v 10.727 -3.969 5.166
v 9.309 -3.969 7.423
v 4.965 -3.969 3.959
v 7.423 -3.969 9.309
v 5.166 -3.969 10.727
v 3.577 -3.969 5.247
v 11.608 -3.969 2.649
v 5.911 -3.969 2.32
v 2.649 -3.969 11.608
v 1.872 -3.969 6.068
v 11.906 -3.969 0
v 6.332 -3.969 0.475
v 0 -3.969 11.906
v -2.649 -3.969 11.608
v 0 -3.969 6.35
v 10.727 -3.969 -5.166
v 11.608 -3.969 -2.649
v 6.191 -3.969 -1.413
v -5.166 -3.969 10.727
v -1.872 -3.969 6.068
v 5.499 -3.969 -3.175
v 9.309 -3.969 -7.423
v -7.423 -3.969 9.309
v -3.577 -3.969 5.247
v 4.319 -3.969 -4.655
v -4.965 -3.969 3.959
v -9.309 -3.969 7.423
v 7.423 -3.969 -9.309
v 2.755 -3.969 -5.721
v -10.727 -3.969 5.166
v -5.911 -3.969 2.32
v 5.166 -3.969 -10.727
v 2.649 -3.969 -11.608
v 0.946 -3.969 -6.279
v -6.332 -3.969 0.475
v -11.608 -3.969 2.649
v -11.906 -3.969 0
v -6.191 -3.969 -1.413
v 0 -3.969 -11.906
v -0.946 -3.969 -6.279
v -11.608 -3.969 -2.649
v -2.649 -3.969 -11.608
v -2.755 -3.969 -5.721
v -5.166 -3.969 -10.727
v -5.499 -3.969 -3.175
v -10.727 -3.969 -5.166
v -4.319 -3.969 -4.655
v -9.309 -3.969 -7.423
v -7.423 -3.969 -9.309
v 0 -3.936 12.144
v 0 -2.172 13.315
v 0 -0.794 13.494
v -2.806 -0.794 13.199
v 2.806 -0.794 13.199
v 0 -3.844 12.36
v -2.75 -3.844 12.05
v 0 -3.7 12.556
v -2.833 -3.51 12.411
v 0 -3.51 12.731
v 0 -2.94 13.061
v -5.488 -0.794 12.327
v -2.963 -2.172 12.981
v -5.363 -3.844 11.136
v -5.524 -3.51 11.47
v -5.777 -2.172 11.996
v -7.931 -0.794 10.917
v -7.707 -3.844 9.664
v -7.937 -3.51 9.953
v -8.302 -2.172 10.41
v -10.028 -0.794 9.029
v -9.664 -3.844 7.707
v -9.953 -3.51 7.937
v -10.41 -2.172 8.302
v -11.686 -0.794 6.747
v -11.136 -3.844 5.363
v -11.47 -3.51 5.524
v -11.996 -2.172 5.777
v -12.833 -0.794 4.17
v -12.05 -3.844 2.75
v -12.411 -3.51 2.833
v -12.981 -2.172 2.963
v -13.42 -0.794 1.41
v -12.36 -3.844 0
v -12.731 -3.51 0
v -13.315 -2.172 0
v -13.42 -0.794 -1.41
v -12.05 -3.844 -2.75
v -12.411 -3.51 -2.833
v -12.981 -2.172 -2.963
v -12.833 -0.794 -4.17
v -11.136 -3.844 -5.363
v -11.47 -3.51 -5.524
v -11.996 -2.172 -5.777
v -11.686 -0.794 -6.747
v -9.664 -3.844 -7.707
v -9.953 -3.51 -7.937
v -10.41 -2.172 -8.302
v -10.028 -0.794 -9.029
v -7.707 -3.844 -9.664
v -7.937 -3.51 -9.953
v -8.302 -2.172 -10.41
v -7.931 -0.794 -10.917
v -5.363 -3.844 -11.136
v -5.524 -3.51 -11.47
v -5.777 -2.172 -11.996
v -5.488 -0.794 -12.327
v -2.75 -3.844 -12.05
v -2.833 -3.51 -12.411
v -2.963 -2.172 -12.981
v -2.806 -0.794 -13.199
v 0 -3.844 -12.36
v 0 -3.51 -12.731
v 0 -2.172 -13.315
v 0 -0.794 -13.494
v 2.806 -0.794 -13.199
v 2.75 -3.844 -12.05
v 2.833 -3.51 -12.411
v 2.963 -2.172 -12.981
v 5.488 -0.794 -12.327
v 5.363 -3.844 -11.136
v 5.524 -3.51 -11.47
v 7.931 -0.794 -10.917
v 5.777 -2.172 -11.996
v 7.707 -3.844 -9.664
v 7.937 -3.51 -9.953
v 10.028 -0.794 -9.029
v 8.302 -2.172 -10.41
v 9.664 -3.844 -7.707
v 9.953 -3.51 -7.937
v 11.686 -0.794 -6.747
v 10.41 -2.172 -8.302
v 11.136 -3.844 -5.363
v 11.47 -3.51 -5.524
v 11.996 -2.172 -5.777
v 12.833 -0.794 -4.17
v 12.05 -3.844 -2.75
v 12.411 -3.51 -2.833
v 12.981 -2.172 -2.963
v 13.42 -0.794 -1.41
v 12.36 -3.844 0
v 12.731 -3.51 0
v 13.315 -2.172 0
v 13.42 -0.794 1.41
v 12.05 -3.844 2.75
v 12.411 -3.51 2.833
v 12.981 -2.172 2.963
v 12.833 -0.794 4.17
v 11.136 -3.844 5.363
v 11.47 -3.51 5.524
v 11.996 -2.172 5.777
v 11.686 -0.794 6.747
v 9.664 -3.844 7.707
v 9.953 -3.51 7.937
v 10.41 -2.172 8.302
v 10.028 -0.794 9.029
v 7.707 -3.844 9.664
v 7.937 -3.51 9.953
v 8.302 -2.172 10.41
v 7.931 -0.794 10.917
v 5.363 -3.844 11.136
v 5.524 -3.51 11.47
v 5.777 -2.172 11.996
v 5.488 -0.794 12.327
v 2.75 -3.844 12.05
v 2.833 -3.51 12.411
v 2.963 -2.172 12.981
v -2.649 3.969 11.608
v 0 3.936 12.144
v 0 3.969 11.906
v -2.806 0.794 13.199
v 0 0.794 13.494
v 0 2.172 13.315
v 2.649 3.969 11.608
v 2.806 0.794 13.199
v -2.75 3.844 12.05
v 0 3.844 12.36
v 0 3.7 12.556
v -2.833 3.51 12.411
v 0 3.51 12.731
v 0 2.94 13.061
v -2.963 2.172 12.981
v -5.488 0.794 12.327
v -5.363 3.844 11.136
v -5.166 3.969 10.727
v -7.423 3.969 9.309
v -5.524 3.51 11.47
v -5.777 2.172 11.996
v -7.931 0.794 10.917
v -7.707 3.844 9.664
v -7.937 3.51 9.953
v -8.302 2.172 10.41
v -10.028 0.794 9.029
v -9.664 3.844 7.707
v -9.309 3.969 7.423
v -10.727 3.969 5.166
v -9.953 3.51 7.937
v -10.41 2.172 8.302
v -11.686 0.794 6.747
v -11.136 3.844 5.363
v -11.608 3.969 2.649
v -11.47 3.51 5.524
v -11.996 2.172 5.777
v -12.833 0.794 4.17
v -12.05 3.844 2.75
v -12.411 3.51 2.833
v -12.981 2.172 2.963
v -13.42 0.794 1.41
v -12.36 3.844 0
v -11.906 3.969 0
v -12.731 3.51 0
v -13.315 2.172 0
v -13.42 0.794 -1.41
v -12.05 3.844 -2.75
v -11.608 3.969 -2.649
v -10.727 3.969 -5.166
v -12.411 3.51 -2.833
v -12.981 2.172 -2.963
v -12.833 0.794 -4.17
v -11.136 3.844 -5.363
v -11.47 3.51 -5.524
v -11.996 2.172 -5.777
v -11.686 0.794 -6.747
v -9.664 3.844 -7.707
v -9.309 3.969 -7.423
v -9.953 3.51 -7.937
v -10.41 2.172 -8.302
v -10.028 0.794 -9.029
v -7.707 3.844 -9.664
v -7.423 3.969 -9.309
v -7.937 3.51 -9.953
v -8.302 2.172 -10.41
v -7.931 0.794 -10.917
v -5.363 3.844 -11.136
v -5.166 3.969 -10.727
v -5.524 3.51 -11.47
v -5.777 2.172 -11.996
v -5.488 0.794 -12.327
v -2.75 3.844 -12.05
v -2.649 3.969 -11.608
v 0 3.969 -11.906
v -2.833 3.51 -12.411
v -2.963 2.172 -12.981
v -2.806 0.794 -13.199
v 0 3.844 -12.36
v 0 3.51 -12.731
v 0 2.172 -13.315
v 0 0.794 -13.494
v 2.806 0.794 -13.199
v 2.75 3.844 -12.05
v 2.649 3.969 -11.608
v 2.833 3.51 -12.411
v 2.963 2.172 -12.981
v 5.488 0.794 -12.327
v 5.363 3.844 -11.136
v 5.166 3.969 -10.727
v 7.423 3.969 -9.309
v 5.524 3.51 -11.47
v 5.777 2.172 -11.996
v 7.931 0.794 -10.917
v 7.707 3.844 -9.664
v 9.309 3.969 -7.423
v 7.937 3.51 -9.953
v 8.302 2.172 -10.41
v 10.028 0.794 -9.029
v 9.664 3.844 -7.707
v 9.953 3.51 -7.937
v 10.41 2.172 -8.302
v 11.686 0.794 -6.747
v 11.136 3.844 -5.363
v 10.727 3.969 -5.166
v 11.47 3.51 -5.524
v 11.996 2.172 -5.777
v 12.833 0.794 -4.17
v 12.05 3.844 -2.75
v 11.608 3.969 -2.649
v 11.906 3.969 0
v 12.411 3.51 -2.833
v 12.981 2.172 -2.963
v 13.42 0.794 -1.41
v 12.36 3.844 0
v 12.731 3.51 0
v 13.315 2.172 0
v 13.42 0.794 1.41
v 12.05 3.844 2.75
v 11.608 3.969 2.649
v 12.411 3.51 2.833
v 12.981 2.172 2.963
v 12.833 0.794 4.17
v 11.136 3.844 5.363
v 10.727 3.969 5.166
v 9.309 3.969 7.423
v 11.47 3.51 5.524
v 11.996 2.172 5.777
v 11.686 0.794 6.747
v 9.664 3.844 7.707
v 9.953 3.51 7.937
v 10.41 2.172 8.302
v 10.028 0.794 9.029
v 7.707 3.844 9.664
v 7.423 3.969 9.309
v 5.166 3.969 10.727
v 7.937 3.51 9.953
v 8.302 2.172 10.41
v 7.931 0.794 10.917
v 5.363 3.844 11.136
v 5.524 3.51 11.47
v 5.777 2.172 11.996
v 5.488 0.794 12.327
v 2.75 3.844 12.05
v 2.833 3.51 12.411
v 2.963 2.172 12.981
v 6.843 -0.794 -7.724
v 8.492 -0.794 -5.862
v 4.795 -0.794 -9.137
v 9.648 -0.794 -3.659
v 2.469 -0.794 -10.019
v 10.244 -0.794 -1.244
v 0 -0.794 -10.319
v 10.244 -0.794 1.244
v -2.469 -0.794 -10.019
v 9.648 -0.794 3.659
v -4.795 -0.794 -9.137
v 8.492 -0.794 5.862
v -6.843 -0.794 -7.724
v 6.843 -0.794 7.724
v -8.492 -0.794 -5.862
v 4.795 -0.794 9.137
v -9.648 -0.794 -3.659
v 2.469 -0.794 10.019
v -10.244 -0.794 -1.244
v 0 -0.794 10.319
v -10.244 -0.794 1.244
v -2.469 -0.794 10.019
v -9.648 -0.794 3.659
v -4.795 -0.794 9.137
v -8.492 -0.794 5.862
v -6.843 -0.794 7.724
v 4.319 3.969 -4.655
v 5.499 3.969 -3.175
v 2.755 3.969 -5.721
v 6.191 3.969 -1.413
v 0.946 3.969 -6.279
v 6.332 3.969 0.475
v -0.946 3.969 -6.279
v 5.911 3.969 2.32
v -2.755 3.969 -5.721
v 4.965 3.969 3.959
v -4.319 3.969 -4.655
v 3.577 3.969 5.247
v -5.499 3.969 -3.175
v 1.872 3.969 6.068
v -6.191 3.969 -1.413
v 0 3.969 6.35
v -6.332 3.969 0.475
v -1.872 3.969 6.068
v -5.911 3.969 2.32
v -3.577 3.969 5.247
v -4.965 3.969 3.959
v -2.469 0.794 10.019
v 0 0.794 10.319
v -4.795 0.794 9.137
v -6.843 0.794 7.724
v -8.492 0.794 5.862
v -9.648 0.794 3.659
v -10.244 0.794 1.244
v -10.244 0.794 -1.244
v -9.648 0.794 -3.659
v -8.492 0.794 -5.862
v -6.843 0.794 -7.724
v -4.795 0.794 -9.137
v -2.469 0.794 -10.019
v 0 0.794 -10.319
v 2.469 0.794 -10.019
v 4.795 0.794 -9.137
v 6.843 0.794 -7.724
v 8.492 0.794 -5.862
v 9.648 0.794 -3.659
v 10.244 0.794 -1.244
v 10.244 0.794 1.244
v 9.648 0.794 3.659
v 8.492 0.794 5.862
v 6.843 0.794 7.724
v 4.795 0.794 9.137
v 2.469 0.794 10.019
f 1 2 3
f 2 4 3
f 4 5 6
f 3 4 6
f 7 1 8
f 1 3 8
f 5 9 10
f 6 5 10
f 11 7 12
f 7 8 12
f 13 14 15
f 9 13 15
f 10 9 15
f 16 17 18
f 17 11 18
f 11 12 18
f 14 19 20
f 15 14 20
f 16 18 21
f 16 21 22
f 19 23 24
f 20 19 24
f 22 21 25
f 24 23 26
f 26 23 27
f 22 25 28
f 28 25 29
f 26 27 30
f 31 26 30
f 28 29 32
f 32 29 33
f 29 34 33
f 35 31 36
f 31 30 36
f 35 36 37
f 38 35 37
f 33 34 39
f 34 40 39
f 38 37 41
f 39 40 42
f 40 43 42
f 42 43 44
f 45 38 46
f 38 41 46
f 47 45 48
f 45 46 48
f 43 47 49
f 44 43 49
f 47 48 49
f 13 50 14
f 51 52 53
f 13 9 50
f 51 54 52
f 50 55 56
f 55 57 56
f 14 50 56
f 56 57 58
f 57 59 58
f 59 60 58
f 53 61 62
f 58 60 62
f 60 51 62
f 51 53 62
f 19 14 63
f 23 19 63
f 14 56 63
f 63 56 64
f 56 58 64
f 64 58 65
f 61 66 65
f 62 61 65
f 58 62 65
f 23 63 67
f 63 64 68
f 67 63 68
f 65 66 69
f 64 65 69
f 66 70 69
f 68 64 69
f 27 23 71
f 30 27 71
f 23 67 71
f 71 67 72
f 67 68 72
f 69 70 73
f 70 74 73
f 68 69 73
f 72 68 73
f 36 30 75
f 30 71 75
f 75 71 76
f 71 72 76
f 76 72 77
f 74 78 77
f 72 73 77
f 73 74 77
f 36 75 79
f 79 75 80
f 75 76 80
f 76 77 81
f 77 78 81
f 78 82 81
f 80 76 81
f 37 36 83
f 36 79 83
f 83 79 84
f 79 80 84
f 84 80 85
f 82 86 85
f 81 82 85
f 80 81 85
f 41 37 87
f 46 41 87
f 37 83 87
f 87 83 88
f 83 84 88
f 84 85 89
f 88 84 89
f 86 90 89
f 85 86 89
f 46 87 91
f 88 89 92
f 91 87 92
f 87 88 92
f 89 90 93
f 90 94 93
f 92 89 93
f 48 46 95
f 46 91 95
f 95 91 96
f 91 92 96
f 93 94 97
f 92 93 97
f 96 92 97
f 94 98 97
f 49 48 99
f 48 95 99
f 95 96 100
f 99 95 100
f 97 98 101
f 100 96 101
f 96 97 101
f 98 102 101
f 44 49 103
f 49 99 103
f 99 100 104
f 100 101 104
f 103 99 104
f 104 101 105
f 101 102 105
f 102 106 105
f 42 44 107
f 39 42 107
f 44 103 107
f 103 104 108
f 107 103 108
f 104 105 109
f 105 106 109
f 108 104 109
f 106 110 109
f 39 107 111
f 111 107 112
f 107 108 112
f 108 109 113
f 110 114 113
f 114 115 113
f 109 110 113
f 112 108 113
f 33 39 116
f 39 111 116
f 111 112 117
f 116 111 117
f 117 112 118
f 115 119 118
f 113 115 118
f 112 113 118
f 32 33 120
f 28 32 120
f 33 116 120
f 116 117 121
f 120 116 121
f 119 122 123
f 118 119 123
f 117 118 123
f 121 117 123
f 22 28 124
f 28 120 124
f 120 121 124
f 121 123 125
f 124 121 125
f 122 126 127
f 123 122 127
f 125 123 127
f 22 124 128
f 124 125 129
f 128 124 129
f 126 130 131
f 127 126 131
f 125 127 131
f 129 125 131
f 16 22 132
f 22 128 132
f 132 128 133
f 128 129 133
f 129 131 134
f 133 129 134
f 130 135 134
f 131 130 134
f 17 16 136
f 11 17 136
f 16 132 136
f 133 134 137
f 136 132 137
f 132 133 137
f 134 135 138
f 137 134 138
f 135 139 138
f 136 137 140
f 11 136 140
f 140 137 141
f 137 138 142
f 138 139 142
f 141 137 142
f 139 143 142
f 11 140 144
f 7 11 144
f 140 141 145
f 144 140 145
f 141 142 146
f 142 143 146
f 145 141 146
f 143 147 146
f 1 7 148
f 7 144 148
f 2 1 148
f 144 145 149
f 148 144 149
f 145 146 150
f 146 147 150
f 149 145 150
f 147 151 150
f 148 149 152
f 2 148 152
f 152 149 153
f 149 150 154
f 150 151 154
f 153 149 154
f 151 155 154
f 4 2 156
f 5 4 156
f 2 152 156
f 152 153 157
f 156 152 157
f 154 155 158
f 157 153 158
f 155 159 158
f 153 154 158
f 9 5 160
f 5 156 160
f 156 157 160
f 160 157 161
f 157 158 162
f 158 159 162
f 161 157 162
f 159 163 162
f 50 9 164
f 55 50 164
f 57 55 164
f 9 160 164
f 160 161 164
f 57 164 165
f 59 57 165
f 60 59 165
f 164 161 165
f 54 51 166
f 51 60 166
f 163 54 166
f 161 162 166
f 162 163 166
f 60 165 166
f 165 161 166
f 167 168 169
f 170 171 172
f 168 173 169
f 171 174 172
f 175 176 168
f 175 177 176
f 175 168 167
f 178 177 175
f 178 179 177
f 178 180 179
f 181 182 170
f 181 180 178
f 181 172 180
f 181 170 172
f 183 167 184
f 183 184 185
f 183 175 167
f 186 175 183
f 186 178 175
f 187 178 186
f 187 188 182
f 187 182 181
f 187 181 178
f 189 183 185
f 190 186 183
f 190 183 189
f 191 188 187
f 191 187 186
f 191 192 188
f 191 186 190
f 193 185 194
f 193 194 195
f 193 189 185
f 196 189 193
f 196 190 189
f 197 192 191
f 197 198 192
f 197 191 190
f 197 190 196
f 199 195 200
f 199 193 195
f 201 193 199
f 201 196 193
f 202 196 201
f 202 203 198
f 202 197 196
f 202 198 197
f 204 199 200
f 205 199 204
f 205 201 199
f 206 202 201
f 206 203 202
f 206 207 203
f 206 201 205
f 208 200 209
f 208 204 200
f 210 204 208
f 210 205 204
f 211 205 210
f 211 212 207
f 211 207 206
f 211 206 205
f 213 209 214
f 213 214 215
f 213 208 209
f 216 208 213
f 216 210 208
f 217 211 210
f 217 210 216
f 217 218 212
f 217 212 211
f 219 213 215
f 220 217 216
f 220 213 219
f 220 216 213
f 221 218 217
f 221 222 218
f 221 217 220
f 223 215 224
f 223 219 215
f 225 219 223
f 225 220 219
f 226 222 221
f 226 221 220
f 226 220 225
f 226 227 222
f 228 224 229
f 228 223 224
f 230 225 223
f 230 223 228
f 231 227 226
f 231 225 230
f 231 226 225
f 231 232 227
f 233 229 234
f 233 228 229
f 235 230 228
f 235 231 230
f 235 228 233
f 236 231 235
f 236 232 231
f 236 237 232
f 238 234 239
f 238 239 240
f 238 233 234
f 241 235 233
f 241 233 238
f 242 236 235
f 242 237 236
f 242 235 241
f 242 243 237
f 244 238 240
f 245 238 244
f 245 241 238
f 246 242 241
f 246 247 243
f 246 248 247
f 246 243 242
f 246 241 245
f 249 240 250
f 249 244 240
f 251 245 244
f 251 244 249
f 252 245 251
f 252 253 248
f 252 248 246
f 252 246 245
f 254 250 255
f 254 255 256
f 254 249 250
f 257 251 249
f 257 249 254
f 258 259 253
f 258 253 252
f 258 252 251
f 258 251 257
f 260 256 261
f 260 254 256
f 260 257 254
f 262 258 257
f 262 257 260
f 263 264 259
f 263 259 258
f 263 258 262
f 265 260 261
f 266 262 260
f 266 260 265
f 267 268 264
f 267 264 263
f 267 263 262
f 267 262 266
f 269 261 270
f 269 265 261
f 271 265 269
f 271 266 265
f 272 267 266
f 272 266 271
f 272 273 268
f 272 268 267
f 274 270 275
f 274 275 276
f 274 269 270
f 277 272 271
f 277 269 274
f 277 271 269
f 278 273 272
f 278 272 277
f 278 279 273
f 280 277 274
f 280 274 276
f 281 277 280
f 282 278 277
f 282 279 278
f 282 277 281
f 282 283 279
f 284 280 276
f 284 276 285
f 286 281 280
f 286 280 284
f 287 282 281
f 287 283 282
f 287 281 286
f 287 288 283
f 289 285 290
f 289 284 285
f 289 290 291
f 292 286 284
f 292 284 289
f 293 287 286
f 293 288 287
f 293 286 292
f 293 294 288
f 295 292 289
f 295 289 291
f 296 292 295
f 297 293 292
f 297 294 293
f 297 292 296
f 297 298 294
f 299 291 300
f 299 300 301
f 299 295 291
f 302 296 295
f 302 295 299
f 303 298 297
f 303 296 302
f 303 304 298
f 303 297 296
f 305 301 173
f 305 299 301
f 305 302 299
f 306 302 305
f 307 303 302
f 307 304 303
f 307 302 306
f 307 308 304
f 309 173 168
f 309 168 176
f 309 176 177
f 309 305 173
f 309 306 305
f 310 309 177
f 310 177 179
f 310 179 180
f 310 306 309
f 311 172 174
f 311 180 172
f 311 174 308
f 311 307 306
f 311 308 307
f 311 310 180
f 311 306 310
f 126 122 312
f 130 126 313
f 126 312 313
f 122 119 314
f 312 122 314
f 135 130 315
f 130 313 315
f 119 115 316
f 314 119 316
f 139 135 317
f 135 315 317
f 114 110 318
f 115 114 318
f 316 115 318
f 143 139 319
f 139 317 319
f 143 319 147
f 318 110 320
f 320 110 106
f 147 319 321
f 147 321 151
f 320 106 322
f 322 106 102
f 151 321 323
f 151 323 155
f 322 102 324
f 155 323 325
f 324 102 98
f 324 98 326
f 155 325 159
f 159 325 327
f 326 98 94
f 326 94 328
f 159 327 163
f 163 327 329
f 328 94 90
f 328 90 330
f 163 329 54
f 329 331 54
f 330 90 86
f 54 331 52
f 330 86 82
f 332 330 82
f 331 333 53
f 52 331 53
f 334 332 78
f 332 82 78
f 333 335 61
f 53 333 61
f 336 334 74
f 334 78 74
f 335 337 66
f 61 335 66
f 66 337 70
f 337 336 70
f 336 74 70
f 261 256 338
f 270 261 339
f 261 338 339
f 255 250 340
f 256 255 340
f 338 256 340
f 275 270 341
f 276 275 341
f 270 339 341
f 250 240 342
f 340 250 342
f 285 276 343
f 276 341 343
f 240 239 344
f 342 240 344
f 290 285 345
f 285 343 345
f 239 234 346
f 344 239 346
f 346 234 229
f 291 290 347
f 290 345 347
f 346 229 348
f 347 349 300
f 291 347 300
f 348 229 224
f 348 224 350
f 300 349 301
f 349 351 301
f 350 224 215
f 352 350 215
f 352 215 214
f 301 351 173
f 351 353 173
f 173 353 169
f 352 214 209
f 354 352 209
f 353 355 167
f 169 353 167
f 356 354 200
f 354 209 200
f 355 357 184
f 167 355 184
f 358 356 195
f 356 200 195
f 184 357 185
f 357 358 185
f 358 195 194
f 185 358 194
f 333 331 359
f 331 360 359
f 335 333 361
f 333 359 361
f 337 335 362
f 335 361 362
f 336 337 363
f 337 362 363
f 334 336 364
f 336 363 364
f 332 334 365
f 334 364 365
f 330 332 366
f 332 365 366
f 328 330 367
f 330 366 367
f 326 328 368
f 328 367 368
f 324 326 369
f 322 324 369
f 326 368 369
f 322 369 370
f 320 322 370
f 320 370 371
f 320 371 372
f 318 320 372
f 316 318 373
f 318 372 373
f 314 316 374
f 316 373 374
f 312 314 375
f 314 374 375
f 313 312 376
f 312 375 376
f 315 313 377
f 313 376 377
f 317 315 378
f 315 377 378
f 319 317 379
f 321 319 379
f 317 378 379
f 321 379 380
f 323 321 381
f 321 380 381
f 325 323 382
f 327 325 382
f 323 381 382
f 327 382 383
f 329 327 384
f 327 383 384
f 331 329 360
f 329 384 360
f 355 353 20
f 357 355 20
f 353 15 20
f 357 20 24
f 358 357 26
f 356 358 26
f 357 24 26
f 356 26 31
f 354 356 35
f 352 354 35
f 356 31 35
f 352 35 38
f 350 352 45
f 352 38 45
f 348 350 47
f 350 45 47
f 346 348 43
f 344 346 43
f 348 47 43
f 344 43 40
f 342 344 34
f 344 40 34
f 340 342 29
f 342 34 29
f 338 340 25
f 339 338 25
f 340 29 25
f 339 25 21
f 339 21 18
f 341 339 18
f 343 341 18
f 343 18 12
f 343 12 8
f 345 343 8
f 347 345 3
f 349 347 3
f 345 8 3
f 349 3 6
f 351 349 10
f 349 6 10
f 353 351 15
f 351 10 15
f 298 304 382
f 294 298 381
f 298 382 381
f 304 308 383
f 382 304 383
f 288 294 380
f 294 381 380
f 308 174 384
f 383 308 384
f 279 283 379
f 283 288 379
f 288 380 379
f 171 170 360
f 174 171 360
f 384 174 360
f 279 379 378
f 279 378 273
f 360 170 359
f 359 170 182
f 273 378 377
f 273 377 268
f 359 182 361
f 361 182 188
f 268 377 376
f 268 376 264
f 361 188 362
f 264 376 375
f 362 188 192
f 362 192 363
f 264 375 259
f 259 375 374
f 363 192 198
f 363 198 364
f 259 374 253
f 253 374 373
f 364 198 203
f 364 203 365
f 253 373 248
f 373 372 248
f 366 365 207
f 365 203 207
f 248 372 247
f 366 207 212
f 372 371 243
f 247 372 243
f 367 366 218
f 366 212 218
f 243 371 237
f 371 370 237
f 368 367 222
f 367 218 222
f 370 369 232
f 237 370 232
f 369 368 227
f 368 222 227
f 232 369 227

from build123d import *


with BuildPart() as part:
    # Sketch1 → Revolve1 (revolve)
    with BuildSketch(Plane.XY, mode=Mode.PRIVATE) as revolve1_sk:
        with BuildLine():
            Line((-6.35, 3.96875), (-6.35, -3.96875))
            Line((-6.35, -3.96875), (-11.90625, -3.96875))
            add(Edge.make_bspline(
                [(-11.90625, -3.96875), (-13.052015746, -3.96875), (-13.49375, -1.832832331), (-13.49375, -0.79375)],
                knots=[0, 0, 0, 0, 1, 1, 1, 1], degree=3))
            Line((-13.49375, -0.79375), (-10.31875, -0.79375))
            Line((-10.31875, -0.79375), (-10.31875, 0.79375))
            Line((-10.31875, 0.79375), (-13.49375, 0.79375))
            add(Edge.make_bspline(
                [(-11.90625, 3.96875), (-13.052015746, 3.96875), (-13.49375, 1.832832331), (-13.49375, 0.79375)],
                knots=[0, 0, 0, 0, 1, 1, 1, 1], degree=3))
            Line((-11.90625, 3.96875), (-6.35, 3.96875))
        make_face()
    revolve(revolve1_sk.sketch.rotate(Axis((0, 96.264631407, 0), (0, -1, 0)), 270), axis=Axis((0, 96.264631407, 0), (0, -1, 0)))


solid = part.part
